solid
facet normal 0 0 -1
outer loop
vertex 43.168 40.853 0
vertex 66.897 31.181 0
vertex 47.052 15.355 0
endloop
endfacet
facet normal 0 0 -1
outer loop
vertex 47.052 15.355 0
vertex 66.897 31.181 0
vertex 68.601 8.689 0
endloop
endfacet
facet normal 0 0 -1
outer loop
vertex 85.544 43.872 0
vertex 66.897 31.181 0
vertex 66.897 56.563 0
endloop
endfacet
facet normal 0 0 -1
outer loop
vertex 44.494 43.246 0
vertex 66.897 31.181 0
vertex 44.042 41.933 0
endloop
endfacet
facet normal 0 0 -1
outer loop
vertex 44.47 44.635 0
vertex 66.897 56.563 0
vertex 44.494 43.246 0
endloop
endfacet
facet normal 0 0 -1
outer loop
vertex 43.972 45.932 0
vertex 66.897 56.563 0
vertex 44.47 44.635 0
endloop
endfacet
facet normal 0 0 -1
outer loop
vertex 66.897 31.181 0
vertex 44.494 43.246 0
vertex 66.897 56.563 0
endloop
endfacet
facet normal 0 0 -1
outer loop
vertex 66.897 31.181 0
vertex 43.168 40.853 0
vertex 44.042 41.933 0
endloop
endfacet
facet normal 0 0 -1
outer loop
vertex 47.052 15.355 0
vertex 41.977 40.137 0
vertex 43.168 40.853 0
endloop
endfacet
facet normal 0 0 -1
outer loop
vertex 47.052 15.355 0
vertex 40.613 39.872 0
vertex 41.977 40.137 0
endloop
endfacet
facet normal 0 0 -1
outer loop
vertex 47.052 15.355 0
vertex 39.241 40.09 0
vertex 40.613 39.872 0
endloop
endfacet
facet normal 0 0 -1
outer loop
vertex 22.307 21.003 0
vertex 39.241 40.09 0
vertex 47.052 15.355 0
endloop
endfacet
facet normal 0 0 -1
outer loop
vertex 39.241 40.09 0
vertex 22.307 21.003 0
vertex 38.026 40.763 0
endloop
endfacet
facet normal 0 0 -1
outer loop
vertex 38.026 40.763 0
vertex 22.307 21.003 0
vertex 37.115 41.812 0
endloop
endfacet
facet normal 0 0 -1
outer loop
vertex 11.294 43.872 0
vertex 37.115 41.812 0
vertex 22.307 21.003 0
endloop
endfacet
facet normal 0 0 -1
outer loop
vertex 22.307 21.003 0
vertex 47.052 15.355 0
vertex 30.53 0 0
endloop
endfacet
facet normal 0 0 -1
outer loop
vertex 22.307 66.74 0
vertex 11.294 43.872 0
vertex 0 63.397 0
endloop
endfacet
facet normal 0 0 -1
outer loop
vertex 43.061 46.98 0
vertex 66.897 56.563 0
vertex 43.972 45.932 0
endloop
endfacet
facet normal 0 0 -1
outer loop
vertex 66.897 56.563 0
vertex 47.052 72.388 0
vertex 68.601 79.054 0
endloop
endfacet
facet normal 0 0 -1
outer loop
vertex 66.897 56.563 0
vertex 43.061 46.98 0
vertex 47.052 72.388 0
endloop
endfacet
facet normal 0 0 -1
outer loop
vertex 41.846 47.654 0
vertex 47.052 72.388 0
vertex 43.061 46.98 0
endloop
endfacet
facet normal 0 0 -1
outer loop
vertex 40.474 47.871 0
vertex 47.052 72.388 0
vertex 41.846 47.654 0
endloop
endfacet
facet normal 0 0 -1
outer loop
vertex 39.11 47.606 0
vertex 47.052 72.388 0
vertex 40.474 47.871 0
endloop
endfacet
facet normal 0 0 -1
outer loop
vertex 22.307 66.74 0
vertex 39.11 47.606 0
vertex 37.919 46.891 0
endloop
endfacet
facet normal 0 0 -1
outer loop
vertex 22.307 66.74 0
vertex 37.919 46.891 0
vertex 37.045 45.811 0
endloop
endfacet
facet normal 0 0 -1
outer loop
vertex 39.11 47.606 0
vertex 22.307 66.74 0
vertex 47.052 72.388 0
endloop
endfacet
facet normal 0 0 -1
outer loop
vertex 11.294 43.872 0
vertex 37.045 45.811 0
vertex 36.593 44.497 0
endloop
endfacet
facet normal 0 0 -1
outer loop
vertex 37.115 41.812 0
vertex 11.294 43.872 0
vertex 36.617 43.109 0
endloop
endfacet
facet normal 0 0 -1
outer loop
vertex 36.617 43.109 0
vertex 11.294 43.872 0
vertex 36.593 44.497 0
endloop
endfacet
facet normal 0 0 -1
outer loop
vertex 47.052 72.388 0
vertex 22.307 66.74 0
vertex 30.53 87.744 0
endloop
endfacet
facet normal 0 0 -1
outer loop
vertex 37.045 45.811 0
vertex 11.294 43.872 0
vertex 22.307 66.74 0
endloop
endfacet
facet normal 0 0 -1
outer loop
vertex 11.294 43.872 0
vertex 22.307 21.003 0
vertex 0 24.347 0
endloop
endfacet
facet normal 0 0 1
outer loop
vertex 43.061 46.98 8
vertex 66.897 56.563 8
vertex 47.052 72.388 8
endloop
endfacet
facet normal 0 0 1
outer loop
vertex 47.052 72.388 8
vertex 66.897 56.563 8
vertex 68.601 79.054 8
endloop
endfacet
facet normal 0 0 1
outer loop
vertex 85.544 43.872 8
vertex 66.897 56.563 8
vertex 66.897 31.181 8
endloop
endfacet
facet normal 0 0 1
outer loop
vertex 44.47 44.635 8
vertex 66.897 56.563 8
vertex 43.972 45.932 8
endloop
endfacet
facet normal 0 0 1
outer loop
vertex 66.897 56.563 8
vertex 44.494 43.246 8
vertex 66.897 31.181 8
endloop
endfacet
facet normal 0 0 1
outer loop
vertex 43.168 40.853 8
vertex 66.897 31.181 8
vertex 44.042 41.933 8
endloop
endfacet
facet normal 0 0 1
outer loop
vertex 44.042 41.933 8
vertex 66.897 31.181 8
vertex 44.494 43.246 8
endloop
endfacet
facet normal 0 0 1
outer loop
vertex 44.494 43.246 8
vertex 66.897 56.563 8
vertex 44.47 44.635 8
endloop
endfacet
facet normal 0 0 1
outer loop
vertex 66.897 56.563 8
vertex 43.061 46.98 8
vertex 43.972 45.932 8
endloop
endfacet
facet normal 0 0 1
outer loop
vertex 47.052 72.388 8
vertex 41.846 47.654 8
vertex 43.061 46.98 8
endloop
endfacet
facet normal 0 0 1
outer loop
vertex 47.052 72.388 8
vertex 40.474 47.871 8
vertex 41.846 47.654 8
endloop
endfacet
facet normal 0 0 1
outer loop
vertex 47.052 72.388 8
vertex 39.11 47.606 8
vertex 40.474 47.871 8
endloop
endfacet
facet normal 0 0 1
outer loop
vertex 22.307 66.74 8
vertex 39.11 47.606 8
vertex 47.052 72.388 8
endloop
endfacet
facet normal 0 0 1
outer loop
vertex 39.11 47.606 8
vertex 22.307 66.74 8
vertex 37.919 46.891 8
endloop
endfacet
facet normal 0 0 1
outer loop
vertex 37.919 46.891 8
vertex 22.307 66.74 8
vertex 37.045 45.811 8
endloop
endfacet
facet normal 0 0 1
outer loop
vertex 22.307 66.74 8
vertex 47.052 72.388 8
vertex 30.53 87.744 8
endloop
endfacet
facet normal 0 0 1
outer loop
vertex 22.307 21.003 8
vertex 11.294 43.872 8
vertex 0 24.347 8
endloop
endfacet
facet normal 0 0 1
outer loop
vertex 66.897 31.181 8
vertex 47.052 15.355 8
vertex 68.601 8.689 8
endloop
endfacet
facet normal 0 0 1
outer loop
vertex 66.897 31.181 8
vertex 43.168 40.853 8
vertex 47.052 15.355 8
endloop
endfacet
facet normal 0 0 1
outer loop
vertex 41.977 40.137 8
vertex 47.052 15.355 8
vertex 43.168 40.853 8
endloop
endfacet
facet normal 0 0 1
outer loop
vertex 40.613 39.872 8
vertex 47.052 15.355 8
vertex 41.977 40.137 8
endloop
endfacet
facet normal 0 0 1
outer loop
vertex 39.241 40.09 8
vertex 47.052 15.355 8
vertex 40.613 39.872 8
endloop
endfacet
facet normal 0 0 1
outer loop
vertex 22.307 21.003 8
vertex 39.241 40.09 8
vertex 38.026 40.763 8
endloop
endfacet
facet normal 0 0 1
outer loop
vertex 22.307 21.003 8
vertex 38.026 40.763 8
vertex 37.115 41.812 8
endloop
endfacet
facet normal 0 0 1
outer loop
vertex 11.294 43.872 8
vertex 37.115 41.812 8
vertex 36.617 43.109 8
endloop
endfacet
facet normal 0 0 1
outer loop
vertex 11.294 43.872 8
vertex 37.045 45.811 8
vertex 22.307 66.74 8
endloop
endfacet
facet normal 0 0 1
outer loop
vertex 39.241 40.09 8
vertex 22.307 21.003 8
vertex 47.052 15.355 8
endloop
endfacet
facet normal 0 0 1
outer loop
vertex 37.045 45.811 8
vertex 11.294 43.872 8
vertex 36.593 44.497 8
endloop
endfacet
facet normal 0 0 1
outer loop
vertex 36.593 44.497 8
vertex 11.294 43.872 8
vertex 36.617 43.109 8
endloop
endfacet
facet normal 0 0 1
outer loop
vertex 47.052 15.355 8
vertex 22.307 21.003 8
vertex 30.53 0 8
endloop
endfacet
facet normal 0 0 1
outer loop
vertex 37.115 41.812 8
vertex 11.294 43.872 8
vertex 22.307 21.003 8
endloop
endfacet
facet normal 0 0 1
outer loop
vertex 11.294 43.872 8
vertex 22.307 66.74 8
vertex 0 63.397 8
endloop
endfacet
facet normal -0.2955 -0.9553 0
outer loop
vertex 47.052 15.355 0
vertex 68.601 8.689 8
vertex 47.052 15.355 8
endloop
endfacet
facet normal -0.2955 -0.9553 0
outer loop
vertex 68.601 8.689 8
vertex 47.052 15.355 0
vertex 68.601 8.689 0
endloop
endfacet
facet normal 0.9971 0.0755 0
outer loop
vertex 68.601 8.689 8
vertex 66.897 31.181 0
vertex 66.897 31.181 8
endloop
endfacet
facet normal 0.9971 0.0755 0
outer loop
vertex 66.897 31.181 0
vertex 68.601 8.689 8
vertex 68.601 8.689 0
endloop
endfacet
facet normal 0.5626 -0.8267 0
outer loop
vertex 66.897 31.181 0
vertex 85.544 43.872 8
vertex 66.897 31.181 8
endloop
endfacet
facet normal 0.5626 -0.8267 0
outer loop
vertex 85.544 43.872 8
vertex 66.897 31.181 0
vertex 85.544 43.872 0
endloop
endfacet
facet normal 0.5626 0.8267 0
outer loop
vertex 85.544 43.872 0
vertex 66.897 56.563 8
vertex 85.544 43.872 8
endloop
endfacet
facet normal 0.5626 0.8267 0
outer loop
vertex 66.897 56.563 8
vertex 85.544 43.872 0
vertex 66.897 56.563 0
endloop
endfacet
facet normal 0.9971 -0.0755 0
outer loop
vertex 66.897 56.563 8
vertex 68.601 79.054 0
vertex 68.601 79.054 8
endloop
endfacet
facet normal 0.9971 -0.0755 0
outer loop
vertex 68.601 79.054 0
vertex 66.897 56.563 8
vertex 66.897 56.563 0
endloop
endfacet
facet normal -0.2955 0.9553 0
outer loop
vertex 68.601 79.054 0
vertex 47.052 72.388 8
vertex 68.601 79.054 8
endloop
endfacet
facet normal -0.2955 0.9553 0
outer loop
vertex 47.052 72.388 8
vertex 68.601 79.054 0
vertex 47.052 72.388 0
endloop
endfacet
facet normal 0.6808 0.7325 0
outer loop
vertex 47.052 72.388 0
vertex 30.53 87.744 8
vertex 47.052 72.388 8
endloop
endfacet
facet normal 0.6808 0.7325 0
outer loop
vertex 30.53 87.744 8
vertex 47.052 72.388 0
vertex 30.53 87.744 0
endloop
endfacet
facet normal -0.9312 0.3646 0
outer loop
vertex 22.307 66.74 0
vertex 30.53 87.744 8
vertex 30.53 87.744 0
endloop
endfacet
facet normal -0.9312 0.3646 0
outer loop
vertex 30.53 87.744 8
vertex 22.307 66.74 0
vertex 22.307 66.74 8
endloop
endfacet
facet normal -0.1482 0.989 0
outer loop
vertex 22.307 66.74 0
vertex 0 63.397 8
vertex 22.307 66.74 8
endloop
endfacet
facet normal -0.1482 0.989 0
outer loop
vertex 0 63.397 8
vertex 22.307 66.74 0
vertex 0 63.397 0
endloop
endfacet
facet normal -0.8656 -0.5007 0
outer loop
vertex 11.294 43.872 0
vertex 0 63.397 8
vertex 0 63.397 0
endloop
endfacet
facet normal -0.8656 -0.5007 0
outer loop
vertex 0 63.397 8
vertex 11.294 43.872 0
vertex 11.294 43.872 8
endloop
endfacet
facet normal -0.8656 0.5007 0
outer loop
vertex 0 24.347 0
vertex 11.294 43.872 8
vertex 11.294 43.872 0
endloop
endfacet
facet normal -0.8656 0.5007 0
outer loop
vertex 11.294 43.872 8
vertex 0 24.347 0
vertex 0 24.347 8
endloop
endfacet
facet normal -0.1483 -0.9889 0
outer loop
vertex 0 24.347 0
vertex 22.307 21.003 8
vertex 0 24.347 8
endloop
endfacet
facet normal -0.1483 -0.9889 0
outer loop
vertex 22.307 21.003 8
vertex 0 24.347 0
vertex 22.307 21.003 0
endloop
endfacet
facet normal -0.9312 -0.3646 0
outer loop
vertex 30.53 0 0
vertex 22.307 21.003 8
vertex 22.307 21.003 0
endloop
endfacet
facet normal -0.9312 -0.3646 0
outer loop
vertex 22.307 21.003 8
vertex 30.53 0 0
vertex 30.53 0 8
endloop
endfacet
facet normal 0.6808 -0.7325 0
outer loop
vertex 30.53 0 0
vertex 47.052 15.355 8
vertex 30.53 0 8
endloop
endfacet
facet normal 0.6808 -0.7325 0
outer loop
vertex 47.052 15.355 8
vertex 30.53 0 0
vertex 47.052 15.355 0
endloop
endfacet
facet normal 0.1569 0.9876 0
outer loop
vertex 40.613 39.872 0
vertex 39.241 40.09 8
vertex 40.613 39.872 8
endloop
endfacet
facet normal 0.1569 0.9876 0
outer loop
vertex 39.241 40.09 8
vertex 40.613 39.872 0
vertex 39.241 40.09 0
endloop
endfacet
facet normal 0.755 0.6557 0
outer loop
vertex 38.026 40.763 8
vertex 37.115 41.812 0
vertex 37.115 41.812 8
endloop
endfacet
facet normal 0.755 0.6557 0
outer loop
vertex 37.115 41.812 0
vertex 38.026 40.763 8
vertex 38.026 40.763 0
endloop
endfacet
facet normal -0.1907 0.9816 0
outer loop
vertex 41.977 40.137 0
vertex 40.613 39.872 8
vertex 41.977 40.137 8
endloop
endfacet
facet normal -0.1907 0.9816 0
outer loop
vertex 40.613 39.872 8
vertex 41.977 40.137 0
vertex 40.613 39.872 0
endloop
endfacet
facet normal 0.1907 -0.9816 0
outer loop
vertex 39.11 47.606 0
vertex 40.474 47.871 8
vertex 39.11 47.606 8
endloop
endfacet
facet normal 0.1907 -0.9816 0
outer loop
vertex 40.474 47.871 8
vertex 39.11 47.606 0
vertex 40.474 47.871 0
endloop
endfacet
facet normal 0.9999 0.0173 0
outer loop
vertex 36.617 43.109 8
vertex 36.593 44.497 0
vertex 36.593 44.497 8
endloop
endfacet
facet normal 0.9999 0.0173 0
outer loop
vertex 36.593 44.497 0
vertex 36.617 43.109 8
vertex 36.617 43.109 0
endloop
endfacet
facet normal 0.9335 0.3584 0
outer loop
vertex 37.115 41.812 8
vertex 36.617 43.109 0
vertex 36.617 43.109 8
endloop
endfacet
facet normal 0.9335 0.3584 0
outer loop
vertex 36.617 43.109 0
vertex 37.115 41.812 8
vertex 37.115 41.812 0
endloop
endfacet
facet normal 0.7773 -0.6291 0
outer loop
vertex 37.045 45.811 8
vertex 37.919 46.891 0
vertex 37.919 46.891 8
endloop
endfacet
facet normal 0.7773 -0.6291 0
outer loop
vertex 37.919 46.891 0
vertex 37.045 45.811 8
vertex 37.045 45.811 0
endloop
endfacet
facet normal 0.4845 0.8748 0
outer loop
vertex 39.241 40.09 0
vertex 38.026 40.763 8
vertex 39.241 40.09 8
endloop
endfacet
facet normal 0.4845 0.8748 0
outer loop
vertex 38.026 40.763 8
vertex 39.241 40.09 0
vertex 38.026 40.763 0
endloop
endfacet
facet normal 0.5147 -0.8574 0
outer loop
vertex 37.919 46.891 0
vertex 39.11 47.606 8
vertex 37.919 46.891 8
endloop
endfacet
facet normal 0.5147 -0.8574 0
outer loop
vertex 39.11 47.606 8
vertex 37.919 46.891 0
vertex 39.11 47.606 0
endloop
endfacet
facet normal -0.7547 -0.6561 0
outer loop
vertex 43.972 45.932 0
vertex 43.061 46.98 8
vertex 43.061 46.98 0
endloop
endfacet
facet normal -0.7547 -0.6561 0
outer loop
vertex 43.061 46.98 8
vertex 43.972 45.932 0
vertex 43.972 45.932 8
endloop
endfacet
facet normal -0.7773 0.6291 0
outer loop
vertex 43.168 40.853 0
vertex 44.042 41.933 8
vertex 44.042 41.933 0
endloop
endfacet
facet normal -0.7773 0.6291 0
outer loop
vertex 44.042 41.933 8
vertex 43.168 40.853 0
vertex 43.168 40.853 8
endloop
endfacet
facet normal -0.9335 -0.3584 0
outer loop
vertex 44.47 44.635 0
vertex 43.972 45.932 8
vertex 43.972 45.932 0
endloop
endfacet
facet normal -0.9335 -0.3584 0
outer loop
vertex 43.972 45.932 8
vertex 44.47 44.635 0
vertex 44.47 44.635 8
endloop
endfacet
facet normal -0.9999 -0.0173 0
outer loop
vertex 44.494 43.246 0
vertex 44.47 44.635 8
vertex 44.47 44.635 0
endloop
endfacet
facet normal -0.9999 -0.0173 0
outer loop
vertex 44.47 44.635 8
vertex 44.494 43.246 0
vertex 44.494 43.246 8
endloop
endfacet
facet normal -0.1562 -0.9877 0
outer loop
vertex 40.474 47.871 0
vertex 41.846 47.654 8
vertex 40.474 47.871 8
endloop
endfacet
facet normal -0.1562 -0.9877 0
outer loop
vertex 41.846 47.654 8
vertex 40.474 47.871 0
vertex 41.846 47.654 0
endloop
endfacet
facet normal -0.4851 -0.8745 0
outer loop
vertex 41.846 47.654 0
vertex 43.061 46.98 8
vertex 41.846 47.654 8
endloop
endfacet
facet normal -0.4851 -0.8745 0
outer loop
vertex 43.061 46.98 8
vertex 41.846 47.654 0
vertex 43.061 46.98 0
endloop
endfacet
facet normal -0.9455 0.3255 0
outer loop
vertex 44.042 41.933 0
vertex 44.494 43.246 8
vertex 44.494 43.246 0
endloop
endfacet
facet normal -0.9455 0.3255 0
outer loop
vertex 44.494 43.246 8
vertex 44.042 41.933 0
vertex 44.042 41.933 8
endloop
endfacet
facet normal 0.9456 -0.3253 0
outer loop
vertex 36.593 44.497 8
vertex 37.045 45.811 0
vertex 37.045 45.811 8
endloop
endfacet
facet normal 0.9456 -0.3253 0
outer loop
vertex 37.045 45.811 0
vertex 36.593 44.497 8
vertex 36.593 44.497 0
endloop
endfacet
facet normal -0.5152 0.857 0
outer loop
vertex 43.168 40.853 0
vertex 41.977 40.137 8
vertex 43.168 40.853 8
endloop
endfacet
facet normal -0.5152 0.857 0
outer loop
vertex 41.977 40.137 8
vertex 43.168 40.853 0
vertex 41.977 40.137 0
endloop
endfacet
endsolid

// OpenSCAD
$fn = 32;

// ----------------------------------------------------------------------
// Star wheel: 7-point blunt, R45
// ----------------------------------------------------------------------

// --- parameters (mm) ---
n_points = 7;             // number of points / teeth
r_out = 45;               // tip radius
r_in = 29.25;             // root radius
bore_r = 4;               // centre bore radius
plate_t = 8;              // plate thickness, Z (extrusion height)
bore_d = 8;               // centre bore diameter

profile = [[85.544, 43.872], [66.897, 56.563], [68.601, 79.054], [47.052, 72.388], [30.53, 87.744], [22.307, 66.74], [0, 63.397], [11.294, 43.872], [0, 24.347], [22.307, 21.003], [30.53, 0], [47.052, 15.355], [68.601, 8.689], [66.897, 31.181]];  // primary outline, 14 points, counter clockwise
void_1 = [[44.47, 44.635], [43.972, 45.932], [43.061, 46.98], [41.846, 47.654], [40.474, 47.871], [39.11, 47.606], [37.919, 46.891], [37.045, 45.811], [36.593, 44.497], [36.617, 43.109], [37.115, 41.812], [38.026, 40.763], [39.241, 40.09], [40.613, 39.872], [41.977, 40.137], [43.168, 40.853], [44.042, 41.933], [44.494, 43.246]];  // centre bore, 18 points

// --- the one profile operation ---
difference() {
  linear_extrude(height = plate_t) polygon(points = profile);
  translate([0, 0, -1])
    linear_extrude(height = plate_t + 2) polygon(points = void_1);
}
